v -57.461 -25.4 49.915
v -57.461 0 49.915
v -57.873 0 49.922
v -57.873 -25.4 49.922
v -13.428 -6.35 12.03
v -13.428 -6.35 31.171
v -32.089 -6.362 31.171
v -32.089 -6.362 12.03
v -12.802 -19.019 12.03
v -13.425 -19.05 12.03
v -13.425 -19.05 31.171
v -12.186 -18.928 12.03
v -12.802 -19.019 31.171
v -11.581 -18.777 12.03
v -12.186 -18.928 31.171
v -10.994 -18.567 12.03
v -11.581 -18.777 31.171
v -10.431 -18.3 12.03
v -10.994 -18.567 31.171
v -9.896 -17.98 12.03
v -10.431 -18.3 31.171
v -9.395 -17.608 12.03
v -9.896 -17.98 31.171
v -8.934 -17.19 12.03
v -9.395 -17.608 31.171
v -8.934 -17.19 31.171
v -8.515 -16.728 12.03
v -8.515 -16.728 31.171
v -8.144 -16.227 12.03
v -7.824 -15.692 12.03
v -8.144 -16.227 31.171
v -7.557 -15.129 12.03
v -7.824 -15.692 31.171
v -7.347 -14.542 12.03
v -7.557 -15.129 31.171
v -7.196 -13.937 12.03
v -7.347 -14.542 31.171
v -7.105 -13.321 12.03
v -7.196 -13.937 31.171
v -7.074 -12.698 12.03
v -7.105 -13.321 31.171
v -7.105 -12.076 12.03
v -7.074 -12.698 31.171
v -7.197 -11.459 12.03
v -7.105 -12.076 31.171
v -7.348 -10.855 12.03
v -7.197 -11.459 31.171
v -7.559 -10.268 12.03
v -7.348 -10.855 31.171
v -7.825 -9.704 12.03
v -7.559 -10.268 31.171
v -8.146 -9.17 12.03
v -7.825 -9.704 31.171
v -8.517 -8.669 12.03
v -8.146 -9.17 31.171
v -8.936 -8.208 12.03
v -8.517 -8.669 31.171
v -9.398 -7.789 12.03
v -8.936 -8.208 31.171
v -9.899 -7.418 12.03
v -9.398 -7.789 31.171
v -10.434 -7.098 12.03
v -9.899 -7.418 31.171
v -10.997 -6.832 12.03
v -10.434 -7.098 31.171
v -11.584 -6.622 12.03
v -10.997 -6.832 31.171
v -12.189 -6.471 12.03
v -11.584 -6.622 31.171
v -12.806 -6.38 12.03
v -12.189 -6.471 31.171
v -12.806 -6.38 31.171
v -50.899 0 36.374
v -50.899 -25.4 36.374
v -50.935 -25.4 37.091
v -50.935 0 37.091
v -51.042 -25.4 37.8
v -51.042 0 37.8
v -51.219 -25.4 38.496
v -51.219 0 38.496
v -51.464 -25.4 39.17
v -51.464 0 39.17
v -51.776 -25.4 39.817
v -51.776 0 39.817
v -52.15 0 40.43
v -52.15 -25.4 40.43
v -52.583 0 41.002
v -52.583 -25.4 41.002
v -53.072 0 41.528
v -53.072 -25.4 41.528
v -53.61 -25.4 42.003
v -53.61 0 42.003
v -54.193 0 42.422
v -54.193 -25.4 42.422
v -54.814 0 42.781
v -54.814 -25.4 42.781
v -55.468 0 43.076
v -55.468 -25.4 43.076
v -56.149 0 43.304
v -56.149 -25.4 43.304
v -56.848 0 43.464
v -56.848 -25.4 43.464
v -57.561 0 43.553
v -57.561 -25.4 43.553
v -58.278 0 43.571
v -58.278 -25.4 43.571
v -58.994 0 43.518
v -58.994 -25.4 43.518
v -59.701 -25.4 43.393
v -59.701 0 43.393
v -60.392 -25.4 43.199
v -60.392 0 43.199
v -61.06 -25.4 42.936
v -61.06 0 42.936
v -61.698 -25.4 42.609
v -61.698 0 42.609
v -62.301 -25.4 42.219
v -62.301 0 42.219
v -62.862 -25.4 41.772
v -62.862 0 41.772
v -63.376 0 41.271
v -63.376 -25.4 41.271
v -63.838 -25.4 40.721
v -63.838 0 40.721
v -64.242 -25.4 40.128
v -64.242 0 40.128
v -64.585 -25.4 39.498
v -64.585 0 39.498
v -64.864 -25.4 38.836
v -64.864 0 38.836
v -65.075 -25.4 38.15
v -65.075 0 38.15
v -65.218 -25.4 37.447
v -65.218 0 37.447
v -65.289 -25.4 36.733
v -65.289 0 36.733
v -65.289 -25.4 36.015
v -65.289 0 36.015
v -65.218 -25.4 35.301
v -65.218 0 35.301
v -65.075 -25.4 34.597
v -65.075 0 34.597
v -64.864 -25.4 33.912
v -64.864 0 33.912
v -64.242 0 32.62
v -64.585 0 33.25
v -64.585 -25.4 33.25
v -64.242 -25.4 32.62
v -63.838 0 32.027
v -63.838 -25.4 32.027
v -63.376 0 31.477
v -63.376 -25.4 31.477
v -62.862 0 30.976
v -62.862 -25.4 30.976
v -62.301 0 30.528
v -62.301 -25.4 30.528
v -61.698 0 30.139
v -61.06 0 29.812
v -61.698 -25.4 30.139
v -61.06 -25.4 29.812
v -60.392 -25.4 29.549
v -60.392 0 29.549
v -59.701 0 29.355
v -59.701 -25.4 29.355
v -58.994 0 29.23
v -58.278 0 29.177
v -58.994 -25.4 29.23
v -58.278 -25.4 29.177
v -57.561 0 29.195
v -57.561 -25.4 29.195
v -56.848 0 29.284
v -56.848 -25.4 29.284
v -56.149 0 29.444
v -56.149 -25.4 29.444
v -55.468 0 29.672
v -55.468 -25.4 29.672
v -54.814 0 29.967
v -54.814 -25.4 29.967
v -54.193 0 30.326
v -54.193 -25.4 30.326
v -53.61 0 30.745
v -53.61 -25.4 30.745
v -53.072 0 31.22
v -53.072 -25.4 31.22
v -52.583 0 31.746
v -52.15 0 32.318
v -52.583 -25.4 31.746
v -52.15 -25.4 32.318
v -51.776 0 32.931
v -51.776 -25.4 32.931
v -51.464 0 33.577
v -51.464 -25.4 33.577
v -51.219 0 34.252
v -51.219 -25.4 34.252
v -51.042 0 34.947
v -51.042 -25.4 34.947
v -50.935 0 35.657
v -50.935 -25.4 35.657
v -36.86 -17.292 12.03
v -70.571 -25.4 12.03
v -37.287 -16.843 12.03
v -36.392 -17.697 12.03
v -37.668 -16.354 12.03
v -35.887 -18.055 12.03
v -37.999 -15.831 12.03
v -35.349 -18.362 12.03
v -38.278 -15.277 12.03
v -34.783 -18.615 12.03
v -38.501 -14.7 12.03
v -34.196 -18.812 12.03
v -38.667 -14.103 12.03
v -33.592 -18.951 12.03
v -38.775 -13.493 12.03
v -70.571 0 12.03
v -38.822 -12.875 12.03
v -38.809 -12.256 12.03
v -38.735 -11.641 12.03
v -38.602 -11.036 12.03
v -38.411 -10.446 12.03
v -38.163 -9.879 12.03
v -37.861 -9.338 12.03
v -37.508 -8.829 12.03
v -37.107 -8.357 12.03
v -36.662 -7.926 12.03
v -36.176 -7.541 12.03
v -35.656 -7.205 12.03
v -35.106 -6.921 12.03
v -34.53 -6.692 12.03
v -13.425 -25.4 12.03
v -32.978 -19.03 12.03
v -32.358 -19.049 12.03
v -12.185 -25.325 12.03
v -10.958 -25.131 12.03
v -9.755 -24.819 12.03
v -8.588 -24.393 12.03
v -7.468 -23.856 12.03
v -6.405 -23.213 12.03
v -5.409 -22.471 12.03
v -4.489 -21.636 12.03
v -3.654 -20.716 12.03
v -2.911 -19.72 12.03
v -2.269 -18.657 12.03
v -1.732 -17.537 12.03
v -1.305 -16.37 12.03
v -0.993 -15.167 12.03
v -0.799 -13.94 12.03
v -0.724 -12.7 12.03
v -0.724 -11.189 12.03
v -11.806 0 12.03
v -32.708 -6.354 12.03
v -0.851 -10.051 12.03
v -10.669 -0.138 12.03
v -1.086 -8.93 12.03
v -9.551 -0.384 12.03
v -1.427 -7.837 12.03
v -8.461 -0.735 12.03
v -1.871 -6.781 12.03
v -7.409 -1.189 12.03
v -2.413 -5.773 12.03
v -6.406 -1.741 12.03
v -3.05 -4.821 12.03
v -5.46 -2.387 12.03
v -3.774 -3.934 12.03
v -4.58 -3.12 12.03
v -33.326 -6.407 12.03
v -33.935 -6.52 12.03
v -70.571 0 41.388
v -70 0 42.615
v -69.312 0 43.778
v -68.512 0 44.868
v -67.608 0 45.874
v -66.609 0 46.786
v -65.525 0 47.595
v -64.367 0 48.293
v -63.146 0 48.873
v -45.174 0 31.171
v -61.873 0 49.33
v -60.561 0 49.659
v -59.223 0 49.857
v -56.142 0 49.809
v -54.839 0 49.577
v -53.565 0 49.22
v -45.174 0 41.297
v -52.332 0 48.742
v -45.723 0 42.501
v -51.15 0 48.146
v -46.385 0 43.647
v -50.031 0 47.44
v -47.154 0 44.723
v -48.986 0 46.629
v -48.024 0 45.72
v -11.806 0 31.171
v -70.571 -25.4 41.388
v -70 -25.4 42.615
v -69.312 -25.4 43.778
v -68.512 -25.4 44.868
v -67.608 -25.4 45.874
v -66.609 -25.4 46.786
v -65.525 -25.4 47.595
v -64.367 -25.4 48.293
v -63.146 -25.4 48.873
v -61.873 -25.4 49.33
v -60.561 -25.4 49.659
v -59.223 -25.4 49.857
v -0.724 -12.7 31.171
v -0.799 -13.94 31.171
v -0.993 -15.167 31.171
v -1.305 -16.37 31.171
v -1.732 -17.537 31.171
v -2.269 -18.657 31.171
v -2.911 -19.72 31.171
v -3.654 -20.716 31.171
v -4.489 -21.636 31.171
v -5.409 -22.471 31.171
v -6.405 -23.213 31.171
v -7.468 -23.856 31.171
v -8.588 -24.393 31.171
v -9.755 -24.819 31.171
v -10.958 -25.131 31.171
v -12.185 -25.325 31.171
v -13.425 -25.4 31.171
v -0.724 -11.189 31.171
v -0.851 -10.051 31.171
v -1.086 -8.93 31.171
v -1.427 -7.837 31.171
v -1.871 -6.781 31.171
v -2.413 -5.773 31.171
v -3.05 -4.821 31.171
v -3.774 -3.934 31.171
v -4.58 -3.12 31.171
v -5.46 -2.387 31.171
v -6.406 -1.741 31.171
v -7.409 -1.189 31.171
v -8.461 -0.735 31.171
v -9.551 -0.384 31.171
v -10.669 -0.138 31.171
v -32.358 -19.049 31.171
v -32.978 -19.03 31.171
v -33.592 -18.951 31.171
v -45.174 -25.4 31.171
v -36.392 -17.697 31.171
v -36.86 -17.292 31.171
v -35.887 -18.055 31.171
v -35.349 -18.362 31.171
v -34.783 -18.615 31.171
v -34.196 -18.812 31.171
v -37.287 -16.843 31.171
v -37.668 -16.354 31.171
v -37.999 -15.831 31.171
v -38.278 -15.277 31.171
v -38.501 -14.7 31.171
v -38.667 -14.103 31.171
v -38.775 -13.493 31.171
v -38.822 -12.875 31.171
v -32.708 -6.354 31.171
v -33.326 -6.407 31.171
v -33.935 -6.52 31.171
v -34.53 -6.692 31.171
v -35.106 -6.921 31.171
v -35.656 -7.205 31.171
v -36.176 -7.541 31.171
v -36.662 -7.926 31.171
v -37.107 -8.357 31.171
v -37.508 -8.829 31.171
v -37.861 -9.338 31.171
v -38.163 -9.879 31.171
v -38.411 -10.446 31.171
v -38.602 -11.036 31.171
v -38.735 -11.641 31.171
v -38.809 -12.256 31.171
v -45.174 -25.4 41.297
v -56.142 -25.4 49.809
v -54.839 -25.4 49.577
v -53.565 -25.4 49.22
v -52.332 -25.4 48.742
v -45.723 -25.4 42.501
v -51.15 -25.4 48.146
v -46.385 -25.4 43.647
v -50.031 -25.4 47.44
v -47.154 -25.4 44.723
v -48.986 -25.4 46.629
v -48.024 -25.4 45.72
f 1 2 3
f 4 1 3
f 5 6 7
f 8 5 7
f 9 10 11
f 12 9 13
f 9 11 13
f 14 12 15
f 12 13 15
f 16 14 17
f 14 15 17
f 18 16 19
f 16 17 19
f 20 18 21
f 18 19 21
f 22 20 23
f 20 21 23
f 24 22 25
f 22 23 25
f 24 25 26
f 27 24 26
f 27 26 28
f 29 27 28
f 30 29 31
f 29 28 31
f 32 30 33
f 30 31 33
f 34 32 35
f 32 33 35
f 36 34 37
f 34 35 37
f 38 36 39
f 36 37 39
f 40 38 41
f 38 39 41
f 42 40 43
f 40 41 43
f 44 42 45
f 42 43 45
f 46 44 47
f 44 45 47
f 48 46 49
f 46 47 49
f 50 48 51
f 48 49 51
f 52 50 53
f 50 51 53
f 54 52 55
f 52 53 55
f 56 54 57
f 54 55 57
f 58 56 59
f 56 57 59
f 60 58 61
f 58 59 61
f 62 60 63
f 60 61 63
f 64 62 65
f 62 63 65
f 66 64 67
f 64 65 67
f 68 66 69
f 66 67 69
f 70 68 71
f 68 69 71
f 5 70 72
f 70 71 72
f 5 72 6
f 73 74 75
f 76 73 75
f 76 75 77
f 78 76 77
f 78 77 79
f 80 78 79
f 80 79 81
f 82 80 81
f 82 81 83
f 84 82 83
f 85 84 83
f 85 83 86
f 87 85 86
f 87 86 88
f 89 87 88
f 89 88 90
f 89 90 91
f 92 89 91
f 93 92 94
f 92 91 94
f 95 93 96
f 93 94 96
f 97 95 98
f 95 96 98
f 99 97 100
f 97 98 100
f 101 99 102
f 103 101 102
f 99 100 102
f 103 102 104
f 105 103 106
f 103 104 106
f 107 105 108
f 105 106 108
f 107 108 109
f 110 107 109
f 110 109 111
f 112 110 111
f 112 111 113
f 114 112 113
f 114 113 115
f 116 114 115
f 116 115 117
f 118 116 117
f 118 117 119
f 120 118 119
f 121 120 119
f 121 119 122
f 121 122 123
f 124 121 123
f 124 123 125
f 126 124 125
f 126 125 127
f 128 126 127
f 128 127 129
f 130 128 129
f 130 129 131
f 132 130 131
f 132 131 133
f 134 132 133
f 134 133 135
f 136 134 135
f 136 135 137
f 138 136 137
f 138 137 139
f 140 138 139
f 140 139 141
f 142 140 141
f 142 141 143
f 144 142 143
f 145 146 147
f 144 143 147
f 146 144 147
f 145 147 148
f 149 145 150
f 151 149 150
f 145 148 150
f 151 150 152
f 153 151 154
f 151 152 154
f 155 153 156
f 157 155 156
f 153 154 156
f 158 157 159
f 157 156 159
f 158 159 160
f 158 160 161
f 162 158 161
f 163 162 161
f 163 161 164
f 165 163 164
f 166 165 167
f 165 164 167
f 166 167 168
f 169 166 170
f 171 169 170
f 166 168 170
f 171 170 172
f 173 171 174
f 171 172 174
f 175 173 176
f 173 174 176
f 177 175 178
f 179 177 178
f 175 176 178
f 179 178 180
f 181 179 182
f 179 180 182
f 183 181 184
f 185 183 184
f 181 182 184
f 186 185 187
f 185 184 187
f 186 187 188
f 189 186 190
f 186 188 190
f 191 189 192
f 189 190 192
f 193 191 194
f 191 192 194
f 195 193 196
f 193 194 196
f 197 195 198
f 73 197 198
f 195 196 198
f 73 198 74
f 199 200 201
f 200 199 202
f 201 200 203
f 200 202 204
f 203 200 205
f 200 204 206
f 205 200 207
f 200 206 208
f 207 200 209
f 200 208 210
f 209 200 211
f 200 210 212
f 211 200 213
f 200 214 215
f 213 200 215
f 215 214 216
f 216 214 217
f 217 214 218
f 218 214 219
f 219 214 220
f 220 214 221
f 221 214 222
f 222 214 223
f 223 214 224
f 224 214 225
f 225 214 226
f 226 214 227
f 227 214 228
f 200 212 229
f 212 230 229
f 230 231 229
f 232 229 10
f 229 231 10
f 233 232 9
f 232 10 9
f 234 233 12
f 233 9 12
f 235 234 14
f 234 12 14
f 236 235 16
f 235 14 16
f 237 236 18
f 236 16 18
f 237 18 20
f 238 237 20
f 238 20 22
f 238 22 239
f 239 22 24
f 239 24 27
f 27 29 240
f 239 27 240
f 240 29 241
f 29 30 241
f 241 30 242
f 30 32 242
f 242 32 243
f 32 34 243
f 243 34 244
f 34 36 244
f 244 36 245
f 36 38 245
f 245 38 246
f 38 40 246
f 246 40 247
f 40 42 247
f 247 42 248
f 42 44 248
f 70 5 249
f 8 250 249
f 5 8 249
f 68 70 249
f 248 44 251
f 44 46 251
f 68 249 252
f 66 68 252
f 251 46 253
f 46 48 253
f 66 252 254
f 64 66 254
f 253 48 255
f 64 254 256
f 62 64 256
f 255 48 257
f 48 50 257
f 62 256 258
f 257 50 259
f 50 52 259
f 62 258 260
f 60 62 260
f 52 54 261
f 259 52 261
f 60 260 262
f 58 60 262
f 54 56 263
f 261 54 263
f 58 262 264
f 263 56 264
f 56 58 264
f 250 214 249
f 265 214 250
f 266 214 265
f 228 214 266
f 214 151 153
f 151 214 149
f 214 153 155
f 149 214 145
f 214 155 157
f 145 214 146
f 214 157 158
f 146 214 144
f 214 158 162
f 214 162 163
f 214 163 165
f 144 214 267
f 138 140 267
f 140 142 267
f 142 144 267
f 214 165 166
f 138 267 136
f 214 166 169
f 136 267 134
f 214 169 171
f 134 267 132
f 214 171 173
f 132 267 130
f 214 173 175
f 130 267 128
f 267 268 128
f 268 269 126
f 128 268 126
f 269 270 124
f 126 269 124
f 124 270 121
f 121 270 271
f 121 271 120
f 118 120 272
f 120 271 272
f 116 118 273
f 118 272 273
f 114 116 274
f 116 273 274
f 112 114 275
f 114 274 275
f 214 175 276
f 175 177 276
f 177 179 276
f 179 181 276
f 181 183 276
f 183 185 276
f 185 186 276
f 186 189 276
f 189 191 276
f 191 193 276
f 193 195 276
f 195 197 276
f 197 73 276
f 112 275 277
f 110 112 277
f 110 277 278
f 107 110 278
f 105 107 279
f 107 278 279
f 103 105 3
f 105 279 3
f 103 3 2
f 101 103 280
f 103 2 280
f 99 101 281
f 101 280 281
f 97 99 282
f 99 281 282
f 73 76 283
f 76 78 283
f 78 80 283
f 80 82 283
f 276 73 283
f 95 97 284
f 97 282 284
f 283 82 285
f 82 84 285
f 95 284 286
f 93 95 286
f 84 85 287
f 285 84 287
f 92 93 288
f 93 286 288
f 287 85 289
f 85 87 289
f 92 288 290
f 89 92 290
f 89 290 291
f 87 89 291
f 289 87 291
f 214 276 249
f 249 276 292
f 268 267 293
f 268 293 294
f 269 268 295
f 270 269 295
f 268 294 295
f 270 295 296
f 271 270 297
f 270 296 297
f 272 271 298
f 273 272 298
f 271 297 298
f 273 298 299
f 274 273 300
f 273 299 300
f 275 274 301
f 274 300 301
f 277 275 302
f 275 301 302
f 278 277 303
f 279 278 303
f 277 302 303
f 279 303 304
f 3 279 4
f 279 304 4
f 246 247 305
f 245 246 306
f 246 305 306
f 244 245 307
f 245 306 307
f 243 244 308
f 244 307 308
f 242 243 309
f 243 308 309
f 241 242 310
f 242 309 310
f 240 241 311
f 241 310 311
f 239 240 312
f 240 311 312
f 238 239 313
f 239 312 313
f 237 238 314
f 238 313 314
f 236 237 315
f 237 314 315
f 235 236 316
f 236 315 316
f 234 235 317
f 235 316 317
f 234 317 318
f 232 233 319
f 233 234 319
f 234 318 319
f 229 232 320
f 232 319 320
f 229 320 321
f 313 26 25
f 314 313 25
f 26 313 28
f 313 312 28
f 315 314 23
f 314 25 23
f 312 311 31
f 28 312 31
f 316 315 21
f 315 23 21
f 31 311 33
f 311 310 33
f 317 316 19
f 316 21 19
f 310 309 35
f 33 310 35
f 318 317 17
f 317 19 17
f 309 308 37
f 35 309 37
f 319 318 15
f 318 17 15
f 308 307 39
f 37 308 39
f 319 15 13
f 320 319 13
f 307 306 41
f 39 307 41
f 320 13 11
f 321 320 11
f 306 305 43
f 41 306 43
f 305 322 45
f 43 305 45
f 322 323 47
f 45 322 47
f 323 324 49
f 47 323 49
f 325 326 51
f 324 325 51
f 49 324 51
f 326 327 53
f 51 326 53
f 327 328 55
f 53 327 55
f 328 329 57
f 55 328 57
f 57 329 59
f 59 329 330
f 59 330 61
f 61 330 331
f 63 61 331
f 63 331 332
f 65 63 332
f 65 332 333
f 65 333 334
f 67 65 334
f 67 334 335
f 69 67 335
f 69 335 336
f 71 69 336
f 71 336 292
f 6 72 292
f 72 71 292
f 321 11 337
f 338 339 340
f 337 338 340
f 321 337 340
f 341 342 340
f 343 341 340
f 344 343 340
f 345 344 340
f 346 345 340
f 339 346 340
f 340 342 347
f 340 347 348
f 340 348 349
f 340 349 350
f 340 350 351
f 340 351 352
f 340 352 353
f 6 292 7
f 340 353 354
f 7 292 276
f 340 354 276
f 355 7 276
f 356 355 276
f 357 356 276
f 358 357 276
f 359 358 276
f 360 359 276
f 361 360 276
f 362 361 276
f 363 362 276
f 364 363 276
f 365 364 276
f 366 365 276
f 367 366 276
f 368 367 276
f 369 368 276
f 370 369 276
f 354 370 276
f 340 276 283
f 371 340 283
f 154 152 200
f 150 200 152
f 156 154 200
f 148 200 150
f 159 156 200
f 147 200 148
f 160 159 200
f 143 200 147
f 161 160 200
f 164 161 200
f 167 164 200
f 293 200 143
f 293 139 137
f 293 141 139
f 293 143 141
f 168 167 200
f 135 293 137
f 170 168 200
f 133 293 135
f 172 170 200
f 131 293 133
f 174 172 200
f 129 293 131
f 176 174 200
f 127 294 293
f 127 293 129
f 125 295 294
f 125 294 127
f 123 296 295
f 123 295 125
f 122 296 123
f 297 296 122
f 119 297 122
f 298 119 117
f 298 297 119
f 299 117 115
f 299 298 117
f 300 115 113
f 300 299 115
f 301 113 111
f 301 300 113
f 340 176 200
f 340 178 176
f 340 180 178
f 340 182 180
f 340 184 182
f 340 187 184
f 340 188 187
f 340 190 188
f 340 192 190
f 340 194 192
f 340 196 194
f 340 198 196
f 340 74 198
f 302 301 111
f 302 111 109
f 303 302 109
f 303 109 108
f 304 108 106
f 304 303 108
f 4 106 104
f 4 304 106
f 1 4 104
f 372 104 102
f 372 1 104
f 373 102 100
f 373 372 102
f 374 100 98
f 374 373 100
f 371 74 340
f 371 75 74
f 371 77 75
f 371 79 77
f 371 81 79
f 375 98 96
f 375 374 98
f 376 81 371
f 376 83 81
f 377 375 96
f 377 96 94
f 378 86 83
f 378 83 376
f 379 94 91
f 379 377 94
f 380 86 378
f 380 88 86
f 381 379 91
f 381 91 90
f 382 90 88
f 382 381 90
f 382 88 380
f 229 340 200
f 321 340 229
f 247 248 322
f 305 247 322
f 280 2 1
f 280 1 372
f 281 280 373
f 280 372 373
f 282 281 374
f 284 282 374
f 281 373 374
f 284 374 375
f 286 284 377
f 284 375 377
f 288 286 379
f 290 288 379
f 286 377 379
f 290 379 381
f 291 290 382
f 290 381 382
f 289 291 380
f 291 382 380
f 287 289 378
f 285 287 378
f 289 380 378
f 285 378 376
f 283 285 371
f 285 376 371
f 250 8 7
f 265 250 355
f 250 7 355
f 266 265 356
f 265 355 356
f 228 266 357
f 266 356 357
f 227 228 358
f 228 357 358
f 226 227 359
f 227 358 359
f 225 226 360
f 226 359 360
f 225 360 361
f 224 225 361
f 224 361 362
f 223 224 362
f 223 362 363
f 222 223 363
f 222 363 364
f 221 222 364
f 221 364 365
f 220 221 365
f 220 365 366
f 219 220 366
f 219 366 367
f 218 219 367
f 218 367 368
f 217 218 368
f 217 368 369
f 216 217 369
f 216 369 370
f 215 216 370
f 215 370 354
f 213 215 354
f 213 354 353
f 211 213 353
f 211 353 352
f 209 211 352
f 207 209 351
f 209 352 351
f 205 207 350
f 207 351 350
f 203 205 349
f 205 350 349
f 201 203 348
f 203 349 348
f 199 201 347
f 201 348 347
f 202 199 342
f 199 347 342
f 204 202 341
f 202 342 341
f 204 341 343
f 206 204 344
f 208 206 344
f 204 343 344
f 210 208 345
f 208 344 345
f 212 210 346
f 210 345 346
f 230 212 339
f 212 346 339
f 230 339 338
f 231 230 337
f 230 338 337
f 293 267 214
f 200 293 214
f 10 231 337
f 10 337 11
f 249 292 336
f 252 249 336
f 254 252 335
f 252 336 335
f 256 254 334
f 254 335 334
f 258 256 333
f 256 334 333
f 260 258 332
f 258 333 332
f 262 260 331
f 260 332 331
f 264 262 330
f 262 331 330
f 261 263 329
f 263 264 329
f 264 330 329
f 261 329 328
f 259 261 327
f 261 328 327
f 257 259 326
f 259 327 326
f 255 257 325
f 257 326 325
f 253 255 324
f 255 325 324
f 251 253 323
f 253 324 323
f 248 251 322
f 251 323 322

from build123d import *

# Parameters (mm, degrees)
F1_DEPTH  = 25.4
F2_R      = 6.35
F3_DEPTH  = 19.1426622189
F5_DEPTH  = 19.1426622189
F6_R      = 7.1994737013
F7_DEPTH  = 25.401
F9_DEPTH  = 25.4
F11_DEPTH = 19.1426622189


with BuildPart() as f1:
    # F0 (on Front) → F1 (new body)
    with BuildSketch(Plane.XZ):
        Polygon((-45.1743540521, 49.7133625326), (-70.570941653, 50.1297016121), (-70.570941653, 12.0297016121), (-0.7243540521, 12.0297016121), (-0.7243540521, 31.171363831), (-45.1743540521, 31.171363831), align=None)
    extrude(amount=F1_DEPTH)

    # F2 (on face) → F3 (cut, through all)
    with BuildSketch(Plane.XY.offset(31.171363831)):
        with Locations((-32.4743540521, -12.7)):
            Circle(F2_R)
        with Locations((-13.4243540521, -12.7)):
            Circle(F2_R)
    extrude(amount=-F3_DEPTH, mode=Mode.SUBTRACT)

    # F4 (on face) → F5 (cut, through all)
    with BuildSketch(Plane.XY.offset(31.171363831)):
        with BuildLine():
            Line((-13.4283372002, -6.3500012492), (-32.0889518764, -6.3617064471))
            ThreePointArc((-32.0889518764, -6.3617064471), (-27.8499728061, -8.3482649332), (-26.1243540521, -12.7))
            ThreePointArc((-26.1243540521, -12.7), (-27.9434136021, -17.1489412941), (-32.3583945682, -19.0489411242))
            Line((-32.3583945682, -19.0489411242), (-13.4247091757, -19.0499999901))
            ThreePointArc((-13.4247091757, -19.0499999901), (-19.774353793, -12.7018140123), (-13.4283372002, -6.3500012492))
        make_face()
    extrude(amount=-F5_DEPTH, mode=Mode.SUBTRACT)

    # F6 (on face) → F7 (cut, through all)
    with BuildSketch(Plane.XZ.offset(25.4)):
        with Locations((-58.0986022331, 36.3739425377)):
            Circle(F6_R)
    extrude(amount=-F7_DEPTH, mode=Mode.SUBTRACT)

    # F8 (on face) → F9 (cut)
    with BuildSketch(Plane.XZ.offset(25.4)):
        with BuildLine():
            ThreePointArc((-57.4608641224, 49.9147814938), (-50.0311914148, 47.4398241259), (-45.1743540521, 41.2968133537))
            Line((-45.1743540521, 41.2968133537), (-45.1743540521, 49.7133625326))
            Line((-45.1743540521, 49.7133625326), (-57.4608641224, 49.9147814938))
        make_face()
        with BuildLine():
            ThreePointArc((-70.570941653, 41.3884755726), (-65.5252942865, 47.5947800385), (-57.8726478526, 49.9215320724))
            Line((-57.8726478526, 49.9215320724), (-70.570941653, 50.1297016121))
            Line((-70.570941653, 50.1297016121), (-70.570941653, 41.3884755726))
        make_face()
    extrude(amount=-F9_DEPTH, mode=Mode.SUBTRACT)

    # F10 (on face) → F11 (cut, through all)
    with BuildSketch(Plane.XY.offset(31.171363831)):
        with BuildLine():
            ThreePointArc((-11.8059636609, 0), (-4.1674496382, -3.5171465582), (-0.7243540521, -11.1893241612))
            Line((-0.7243540521, -11.1893241612), (-0.7243540521, 0))
            Line((-0.7243540521, 0), (-11.8059636609, 0))
        make_face()
        with BuildLine():
            Line((-0.7243540521, -25.4), (-0.7243540521, -12.7))
            ThreePointArc((-0.7243540521, -12.7), (-4.4886377498, -21.6359661722), (-13.4247091757, -25.4))
            Line((-13.4247091757, -25.4), (-0.7243540521, -25.4))
        make_face()
    extrude(amount=-F11_DEPTH, mode=Mode.SUBTRACT)


solid = f1.part
